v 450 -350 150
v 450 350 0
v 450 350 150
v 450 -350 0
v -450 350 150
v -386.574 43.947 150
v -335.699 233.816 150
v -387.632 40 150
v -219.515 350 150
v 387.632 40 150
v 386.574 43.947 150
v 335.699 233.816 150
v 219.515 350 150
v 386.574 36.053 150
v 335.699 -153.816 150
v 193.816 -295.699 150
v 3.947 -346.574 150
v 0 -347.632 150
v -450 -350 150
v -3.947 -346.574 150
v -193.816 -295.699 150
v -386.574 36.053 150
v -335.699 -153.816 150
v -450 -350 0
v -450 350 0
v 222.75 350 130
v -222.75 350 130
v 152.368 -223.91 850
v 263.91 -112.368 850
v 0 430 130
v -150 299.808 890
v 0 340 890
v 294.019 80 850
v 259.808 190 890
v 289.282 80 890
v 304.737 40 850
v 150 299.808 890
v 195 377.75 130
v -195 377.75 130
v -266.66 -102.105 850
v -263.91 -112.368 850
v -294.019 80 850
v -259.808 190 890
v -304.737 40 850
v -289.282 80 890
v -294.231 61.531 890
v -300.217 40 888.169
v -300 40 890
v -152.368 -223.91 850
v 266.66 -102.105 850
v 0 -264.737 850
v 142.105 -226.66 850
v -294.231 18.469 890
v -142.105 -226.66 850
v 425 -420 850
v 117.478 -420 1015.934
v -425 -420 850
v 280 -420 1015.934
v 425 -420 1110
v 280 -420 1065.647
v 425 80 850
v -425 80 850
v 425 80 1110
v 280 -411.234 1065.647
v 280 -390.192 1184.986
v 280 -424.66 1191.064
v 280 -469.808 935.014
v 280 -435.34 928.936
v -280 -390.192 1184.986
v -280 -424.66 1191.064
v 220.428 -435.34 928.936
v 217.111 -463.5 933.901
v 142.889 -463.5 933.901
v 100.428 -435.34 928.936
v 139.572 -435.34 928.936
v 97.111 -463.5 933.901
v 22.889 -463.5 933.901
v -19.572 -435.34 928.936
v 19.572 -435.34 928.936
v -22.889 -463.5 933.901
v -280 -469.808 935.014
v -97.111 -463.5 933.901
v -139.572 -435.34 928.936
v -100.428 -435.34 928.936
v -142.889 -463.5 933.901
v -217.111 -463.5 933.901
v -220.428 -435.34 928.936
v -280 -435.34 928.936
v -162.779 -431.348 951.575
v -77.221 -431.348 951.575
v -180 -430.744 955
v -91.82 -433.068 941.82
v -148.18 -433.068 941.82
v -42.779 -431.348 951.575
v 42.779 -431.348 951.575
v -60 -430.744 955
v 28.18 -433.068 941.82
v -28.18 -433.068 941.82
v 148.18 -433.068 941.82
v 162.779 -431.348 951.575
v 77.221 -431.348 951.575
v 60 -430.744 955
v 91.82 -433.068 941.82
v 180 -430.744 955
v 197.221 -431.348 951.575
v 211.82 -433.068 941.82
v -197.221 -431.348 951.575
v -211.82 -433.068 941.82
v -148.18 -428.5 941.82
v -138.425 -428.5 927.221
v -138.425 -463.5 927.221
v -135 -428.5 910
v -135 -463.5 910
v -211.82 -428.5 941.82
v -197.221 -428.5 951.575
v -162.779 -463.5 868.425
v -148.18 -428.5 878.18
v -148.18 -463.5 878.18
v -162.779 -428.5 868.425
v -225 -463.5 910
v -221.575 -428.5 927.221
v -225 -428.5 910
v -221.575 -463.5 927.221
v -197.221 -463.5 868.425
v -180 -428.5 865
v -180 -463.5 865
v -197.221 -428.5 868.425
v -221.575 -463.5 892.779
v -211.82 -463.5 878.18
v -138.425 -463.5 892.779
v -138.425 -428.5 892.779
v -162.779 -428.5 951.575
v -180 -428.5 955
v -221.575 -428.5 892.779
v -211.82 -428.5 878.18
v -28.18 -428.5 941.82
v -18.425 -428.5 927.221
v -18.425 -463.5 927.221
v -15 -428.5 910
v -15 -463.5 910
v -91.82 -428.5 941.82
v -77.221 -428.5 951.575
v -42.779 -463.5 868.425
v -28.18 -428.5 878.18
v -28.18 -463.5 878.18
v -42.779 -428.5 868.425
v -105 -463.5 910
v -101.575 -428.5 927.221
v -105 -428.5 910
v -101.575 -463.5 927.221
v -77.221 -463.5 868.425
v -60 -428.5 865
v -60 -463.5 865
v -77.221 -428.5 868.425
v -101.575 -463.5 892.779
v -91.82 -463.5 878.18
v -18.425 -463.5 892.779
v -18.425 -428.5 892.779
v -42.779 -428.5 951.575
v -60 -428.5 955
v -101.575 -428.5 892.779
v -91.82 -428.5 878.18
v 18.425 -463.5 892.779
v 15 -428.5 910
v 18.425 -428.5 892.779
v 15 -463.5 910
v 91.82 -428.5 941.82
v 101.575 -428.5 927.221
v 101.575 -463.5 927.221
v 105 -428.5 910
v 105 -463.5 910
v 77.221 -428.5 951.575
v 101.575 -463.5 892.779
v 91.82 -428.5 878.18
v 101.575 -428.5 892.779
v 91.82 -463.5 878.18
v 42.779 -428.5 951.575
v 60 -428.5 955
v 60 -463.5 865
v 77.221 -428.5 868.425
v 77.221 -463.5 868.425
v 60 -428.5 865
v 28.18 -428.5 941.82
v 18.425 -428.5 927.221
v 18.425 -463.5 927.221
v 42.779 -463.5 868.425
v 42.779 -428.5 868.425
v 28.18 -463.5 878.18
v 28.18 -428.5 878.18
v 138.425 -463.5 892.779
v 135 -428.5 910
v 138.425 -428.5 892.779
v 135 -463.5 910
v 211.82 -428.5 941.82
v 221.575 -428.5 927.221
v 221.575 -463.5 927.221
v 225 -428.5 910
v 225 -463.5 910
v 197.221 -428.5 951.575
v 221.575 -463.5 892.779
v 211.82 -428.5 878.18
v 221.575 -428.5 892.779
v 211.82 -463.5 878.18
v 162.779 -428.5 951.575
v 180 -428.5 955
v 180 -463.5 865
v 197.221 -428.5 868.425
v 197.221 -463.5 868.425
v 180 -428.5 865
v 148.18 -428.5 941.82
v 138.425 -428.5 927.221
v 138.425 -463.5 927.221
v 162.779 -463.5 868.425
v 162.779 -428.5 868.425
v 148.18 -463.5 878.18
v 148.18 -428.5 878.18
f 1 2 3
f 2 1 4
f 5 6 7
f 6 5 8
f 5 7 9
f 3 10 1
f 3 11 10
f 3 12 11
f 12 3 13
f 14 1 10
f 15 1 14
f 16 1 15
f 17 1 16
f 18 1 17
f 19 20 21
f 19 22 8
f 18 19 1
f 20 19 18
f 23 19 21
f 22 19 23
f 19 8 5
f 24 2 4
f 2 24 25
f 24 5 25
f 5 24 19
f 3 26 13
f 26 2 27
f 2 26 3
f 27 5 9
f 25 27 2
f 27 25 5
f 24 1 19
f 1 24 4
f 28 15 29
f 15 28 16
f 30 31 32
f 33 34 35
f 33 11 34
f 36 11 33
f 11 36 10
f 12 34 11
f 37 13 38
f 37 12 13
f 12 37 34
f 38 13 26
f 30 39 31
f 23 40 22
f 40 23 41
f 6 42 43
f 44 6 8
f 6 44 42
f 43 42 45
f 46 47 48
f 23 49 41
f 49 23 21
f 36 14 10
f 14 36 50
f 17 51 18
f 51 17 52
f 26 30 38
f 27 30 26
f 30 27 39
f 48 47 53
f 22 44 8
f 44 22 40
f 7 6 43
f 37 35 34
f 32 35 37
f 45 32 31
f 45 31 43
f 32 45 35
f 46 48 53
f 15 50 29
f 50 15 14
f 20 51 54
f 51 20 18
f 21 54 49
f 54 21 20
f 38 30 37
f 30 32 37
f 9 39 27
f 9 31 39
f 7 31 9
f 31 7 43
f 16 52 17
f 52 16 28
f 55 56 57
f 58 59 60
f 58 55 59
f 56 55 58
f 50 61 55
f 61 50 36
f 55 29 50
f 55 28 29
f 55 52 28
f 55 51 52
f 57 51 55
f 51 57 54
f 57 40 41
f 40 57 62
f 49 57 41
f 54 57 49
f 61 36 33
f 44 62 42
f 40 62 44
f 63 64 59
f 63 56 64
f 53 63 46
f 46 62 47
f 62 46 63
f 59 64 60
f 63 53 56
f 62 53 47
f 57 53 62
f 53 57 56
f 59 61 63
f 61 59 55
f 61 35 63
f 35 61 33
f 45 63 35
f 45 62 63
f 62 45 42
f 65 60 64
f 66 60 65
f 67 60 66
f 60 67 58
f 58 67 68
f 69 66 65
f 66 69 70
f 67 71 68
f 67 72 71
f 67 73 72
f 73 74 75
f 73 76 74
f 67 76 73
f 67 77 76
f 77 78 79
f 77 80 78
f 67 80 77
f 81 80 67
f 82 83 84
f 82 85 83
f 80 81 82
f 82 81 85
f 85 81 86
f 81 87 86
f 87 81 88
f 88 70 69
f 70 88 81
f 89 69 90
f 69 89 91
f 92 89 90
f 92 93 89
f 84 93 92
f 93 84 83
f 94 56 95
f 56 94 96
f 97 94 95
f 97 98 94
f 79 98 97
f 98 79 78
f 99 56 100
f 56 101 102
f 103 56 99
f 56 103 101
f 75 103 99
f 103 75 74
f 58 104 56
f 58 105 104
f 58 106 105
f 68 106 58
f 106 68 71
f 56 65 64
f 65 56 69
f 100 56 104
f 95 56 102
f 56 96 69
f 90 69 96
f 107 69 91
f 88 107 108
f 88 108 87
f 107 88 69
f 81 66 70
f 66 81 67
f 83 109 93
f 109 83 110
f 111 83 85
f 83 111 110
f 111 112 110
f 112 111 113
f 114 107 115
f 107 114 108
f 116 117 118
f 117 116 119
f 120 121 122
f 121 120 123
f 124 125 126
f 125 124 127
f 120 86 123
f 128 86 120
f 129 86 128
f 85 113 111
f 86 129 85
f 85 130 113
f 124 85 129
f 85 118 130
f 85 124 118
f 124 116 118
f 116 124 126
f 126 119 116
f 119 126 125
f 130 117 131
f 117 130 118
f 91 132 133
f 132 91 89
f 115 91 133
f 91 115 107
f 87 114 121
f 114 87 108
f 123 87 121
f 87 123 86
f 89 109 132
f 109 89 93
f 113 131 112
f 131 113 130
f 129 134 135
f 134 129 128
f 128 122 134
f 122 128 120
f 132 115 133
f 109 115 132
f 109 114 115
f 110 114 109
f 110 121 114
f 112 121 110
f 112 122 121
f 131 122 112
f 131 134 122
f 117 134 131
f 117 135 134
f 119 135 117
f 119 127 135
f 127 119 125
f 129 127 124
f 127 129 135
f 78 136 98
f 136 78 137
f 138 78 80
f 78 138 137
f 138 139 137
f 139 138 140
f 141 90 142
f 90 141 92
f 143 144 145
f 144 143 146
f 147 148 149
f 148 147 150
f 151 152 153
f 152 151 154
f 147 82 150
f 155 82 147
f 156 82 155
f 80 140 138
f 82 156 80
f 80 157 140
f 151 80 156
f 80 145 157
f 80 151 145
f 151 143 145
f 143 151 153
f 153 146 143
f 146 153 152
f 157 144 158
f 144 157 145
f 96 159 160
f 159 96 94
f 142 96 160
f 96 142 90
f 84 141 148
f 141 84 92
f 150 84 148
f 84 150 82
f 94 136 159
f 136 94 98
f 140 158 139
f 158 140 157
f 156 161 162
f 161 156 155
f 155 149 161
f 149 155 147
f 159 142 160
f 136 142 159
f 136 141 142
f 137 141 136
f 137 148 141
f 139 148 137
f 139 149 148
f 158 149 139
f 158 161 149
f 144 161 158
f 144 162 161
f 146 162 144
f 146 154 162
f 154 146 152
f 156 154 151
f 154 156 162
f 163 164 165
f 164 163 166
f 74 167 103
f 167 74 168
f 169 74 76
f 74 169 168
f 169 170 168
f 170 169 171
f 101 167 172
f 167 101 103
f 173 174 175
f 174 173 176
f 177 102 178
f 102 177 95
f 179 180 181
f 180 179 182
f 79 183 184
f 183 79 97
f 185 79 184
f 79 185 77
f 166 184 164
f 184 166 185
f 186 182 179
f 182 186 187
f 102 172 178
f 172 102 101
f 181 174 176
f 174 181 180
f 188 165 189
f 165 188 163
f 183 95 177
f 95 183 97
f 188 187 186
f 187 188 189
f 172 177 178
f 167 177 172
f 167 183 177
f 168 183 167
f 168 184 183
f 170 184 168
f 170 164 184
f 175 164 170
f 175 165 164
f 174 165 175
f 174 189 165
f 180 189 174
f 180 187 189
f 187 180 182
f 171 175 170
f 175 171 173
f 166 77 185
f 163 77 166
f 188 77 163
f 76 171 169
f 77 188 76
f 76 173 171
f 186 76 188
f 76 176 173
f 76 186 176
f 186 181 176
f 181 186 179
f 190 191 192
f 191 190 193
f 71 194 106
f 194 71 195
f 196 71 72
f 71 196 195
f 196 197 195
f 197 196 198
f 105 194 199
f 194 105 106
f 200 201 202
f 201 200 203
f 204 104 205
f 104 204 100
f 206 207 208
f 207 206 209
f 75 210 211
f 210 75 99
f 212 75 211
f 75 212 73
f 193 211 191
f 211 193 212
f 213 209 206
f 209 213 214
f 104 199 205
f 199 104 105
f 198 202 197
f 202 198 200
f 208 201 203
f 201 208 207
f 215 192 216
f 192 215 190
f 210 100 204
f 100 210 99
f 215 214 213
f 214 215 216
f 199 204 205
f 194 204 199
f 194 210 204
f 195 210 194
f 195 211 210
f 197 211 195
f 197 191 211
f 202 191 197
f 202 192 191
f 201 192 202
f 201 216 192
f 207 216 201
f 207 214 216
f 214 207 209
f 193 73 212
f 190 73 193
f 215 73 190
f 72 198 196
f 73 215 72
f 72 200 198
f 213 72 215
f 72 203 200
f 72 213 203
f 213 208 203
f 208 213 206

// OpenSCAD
// Generated by AXM Machine Geometry Foundry 0.4.0
// Asset: AXM-CONSOLE-001 AXM Interactive Control Console v0.4.0
// Units: millimetres; source orientation: +Z up, -Y forward.
// Canonical source is recipe.json. This is an editable generated bridge.

// instance: base | base: base | print_group: base
color([0.09412, 0.11373, 0.15294, 1.00000])
translate([0, 0, 75]) rotate([0, 0, 0]) scale([1, 1, 1]) cube([900, 700, 150], center=true);

// instance: pedestal | base: pedestal | print_group: pedestal
color([0.17647, 0.22745, 0.29804, 1.00000])
translate([0, 40, 510]) rotate([0, 0, 0]) scale([1, 1, 1]) cylinder(h=760, r1=390, r2=300, center=true, $fn=12);

// instance: panel | base: panel | print_group: panel
color([0.17647, 0.22745, 0.29804, 1.00000])
translate([0, -170, 980]) rotate([0, 0, 0]) scale([1, 1, 1]) polyhedron(points=[[-425.0, -250.0, -130.0], [425.0, -250.0, -130.0], [425.0, -250.0, 130.0], [-425.0, 250.0, -130.0], [425.0, 250.0, -130.0], [425.0, 250.0, 130.0]], faces=[[0, 2, 1], [3, 4, 5], [0, 1, 4, 3], [1, 2, 5, 4], [2, 0, 3, 5]], convexity=10);

// instance: screen | base: screen | print_group: screen
color([0.13725, 0.80392, 0.92157, 1.00000])
translate([0, -430, 1060]) rotate([-10, 0, 0]) scale([1, 1, 1]) cube([560, 35, 260], center=true);

// instance: button__l00 | base: button | print_group: button
color([1.00000, 0.67451, 0.14510, 1.00000])
translate([-180, -446, 910]) rotate([90, 0, 0]) scale([1, 1, 1]) cylinder(h=35, r=45, center=true, $fn=16);

// instance: button__l01 | base: button | print_group: button
color([1.00000, 0.67451, 0.14510, 1.00000])
translate([-60, -446, 910]) rotate([90, 0, 0]) scale([1, 1, 1]) cylinder(h=35, r=45, center=true, $fn=16);

// instance: button__l02 | base: button | print_group: button
color([1.00000, 0.67451, 0.14510, 1.00000])
translate([60, -446, 910]) rotate([90, 0, 0]) scale([1, 1, 1]) cylinder(h=35, r=45, center=true, $fn=16);

// instance: button__l03 | base: button | print_group: button
color([1.00000, 0.67451, 0.14510, 1.00000])
translate([180, -446, 910]) rotate([90, 0, 0]) scale([1, 1, 1]) cylinder(h=35, r=45, center=true, $fn=16);
